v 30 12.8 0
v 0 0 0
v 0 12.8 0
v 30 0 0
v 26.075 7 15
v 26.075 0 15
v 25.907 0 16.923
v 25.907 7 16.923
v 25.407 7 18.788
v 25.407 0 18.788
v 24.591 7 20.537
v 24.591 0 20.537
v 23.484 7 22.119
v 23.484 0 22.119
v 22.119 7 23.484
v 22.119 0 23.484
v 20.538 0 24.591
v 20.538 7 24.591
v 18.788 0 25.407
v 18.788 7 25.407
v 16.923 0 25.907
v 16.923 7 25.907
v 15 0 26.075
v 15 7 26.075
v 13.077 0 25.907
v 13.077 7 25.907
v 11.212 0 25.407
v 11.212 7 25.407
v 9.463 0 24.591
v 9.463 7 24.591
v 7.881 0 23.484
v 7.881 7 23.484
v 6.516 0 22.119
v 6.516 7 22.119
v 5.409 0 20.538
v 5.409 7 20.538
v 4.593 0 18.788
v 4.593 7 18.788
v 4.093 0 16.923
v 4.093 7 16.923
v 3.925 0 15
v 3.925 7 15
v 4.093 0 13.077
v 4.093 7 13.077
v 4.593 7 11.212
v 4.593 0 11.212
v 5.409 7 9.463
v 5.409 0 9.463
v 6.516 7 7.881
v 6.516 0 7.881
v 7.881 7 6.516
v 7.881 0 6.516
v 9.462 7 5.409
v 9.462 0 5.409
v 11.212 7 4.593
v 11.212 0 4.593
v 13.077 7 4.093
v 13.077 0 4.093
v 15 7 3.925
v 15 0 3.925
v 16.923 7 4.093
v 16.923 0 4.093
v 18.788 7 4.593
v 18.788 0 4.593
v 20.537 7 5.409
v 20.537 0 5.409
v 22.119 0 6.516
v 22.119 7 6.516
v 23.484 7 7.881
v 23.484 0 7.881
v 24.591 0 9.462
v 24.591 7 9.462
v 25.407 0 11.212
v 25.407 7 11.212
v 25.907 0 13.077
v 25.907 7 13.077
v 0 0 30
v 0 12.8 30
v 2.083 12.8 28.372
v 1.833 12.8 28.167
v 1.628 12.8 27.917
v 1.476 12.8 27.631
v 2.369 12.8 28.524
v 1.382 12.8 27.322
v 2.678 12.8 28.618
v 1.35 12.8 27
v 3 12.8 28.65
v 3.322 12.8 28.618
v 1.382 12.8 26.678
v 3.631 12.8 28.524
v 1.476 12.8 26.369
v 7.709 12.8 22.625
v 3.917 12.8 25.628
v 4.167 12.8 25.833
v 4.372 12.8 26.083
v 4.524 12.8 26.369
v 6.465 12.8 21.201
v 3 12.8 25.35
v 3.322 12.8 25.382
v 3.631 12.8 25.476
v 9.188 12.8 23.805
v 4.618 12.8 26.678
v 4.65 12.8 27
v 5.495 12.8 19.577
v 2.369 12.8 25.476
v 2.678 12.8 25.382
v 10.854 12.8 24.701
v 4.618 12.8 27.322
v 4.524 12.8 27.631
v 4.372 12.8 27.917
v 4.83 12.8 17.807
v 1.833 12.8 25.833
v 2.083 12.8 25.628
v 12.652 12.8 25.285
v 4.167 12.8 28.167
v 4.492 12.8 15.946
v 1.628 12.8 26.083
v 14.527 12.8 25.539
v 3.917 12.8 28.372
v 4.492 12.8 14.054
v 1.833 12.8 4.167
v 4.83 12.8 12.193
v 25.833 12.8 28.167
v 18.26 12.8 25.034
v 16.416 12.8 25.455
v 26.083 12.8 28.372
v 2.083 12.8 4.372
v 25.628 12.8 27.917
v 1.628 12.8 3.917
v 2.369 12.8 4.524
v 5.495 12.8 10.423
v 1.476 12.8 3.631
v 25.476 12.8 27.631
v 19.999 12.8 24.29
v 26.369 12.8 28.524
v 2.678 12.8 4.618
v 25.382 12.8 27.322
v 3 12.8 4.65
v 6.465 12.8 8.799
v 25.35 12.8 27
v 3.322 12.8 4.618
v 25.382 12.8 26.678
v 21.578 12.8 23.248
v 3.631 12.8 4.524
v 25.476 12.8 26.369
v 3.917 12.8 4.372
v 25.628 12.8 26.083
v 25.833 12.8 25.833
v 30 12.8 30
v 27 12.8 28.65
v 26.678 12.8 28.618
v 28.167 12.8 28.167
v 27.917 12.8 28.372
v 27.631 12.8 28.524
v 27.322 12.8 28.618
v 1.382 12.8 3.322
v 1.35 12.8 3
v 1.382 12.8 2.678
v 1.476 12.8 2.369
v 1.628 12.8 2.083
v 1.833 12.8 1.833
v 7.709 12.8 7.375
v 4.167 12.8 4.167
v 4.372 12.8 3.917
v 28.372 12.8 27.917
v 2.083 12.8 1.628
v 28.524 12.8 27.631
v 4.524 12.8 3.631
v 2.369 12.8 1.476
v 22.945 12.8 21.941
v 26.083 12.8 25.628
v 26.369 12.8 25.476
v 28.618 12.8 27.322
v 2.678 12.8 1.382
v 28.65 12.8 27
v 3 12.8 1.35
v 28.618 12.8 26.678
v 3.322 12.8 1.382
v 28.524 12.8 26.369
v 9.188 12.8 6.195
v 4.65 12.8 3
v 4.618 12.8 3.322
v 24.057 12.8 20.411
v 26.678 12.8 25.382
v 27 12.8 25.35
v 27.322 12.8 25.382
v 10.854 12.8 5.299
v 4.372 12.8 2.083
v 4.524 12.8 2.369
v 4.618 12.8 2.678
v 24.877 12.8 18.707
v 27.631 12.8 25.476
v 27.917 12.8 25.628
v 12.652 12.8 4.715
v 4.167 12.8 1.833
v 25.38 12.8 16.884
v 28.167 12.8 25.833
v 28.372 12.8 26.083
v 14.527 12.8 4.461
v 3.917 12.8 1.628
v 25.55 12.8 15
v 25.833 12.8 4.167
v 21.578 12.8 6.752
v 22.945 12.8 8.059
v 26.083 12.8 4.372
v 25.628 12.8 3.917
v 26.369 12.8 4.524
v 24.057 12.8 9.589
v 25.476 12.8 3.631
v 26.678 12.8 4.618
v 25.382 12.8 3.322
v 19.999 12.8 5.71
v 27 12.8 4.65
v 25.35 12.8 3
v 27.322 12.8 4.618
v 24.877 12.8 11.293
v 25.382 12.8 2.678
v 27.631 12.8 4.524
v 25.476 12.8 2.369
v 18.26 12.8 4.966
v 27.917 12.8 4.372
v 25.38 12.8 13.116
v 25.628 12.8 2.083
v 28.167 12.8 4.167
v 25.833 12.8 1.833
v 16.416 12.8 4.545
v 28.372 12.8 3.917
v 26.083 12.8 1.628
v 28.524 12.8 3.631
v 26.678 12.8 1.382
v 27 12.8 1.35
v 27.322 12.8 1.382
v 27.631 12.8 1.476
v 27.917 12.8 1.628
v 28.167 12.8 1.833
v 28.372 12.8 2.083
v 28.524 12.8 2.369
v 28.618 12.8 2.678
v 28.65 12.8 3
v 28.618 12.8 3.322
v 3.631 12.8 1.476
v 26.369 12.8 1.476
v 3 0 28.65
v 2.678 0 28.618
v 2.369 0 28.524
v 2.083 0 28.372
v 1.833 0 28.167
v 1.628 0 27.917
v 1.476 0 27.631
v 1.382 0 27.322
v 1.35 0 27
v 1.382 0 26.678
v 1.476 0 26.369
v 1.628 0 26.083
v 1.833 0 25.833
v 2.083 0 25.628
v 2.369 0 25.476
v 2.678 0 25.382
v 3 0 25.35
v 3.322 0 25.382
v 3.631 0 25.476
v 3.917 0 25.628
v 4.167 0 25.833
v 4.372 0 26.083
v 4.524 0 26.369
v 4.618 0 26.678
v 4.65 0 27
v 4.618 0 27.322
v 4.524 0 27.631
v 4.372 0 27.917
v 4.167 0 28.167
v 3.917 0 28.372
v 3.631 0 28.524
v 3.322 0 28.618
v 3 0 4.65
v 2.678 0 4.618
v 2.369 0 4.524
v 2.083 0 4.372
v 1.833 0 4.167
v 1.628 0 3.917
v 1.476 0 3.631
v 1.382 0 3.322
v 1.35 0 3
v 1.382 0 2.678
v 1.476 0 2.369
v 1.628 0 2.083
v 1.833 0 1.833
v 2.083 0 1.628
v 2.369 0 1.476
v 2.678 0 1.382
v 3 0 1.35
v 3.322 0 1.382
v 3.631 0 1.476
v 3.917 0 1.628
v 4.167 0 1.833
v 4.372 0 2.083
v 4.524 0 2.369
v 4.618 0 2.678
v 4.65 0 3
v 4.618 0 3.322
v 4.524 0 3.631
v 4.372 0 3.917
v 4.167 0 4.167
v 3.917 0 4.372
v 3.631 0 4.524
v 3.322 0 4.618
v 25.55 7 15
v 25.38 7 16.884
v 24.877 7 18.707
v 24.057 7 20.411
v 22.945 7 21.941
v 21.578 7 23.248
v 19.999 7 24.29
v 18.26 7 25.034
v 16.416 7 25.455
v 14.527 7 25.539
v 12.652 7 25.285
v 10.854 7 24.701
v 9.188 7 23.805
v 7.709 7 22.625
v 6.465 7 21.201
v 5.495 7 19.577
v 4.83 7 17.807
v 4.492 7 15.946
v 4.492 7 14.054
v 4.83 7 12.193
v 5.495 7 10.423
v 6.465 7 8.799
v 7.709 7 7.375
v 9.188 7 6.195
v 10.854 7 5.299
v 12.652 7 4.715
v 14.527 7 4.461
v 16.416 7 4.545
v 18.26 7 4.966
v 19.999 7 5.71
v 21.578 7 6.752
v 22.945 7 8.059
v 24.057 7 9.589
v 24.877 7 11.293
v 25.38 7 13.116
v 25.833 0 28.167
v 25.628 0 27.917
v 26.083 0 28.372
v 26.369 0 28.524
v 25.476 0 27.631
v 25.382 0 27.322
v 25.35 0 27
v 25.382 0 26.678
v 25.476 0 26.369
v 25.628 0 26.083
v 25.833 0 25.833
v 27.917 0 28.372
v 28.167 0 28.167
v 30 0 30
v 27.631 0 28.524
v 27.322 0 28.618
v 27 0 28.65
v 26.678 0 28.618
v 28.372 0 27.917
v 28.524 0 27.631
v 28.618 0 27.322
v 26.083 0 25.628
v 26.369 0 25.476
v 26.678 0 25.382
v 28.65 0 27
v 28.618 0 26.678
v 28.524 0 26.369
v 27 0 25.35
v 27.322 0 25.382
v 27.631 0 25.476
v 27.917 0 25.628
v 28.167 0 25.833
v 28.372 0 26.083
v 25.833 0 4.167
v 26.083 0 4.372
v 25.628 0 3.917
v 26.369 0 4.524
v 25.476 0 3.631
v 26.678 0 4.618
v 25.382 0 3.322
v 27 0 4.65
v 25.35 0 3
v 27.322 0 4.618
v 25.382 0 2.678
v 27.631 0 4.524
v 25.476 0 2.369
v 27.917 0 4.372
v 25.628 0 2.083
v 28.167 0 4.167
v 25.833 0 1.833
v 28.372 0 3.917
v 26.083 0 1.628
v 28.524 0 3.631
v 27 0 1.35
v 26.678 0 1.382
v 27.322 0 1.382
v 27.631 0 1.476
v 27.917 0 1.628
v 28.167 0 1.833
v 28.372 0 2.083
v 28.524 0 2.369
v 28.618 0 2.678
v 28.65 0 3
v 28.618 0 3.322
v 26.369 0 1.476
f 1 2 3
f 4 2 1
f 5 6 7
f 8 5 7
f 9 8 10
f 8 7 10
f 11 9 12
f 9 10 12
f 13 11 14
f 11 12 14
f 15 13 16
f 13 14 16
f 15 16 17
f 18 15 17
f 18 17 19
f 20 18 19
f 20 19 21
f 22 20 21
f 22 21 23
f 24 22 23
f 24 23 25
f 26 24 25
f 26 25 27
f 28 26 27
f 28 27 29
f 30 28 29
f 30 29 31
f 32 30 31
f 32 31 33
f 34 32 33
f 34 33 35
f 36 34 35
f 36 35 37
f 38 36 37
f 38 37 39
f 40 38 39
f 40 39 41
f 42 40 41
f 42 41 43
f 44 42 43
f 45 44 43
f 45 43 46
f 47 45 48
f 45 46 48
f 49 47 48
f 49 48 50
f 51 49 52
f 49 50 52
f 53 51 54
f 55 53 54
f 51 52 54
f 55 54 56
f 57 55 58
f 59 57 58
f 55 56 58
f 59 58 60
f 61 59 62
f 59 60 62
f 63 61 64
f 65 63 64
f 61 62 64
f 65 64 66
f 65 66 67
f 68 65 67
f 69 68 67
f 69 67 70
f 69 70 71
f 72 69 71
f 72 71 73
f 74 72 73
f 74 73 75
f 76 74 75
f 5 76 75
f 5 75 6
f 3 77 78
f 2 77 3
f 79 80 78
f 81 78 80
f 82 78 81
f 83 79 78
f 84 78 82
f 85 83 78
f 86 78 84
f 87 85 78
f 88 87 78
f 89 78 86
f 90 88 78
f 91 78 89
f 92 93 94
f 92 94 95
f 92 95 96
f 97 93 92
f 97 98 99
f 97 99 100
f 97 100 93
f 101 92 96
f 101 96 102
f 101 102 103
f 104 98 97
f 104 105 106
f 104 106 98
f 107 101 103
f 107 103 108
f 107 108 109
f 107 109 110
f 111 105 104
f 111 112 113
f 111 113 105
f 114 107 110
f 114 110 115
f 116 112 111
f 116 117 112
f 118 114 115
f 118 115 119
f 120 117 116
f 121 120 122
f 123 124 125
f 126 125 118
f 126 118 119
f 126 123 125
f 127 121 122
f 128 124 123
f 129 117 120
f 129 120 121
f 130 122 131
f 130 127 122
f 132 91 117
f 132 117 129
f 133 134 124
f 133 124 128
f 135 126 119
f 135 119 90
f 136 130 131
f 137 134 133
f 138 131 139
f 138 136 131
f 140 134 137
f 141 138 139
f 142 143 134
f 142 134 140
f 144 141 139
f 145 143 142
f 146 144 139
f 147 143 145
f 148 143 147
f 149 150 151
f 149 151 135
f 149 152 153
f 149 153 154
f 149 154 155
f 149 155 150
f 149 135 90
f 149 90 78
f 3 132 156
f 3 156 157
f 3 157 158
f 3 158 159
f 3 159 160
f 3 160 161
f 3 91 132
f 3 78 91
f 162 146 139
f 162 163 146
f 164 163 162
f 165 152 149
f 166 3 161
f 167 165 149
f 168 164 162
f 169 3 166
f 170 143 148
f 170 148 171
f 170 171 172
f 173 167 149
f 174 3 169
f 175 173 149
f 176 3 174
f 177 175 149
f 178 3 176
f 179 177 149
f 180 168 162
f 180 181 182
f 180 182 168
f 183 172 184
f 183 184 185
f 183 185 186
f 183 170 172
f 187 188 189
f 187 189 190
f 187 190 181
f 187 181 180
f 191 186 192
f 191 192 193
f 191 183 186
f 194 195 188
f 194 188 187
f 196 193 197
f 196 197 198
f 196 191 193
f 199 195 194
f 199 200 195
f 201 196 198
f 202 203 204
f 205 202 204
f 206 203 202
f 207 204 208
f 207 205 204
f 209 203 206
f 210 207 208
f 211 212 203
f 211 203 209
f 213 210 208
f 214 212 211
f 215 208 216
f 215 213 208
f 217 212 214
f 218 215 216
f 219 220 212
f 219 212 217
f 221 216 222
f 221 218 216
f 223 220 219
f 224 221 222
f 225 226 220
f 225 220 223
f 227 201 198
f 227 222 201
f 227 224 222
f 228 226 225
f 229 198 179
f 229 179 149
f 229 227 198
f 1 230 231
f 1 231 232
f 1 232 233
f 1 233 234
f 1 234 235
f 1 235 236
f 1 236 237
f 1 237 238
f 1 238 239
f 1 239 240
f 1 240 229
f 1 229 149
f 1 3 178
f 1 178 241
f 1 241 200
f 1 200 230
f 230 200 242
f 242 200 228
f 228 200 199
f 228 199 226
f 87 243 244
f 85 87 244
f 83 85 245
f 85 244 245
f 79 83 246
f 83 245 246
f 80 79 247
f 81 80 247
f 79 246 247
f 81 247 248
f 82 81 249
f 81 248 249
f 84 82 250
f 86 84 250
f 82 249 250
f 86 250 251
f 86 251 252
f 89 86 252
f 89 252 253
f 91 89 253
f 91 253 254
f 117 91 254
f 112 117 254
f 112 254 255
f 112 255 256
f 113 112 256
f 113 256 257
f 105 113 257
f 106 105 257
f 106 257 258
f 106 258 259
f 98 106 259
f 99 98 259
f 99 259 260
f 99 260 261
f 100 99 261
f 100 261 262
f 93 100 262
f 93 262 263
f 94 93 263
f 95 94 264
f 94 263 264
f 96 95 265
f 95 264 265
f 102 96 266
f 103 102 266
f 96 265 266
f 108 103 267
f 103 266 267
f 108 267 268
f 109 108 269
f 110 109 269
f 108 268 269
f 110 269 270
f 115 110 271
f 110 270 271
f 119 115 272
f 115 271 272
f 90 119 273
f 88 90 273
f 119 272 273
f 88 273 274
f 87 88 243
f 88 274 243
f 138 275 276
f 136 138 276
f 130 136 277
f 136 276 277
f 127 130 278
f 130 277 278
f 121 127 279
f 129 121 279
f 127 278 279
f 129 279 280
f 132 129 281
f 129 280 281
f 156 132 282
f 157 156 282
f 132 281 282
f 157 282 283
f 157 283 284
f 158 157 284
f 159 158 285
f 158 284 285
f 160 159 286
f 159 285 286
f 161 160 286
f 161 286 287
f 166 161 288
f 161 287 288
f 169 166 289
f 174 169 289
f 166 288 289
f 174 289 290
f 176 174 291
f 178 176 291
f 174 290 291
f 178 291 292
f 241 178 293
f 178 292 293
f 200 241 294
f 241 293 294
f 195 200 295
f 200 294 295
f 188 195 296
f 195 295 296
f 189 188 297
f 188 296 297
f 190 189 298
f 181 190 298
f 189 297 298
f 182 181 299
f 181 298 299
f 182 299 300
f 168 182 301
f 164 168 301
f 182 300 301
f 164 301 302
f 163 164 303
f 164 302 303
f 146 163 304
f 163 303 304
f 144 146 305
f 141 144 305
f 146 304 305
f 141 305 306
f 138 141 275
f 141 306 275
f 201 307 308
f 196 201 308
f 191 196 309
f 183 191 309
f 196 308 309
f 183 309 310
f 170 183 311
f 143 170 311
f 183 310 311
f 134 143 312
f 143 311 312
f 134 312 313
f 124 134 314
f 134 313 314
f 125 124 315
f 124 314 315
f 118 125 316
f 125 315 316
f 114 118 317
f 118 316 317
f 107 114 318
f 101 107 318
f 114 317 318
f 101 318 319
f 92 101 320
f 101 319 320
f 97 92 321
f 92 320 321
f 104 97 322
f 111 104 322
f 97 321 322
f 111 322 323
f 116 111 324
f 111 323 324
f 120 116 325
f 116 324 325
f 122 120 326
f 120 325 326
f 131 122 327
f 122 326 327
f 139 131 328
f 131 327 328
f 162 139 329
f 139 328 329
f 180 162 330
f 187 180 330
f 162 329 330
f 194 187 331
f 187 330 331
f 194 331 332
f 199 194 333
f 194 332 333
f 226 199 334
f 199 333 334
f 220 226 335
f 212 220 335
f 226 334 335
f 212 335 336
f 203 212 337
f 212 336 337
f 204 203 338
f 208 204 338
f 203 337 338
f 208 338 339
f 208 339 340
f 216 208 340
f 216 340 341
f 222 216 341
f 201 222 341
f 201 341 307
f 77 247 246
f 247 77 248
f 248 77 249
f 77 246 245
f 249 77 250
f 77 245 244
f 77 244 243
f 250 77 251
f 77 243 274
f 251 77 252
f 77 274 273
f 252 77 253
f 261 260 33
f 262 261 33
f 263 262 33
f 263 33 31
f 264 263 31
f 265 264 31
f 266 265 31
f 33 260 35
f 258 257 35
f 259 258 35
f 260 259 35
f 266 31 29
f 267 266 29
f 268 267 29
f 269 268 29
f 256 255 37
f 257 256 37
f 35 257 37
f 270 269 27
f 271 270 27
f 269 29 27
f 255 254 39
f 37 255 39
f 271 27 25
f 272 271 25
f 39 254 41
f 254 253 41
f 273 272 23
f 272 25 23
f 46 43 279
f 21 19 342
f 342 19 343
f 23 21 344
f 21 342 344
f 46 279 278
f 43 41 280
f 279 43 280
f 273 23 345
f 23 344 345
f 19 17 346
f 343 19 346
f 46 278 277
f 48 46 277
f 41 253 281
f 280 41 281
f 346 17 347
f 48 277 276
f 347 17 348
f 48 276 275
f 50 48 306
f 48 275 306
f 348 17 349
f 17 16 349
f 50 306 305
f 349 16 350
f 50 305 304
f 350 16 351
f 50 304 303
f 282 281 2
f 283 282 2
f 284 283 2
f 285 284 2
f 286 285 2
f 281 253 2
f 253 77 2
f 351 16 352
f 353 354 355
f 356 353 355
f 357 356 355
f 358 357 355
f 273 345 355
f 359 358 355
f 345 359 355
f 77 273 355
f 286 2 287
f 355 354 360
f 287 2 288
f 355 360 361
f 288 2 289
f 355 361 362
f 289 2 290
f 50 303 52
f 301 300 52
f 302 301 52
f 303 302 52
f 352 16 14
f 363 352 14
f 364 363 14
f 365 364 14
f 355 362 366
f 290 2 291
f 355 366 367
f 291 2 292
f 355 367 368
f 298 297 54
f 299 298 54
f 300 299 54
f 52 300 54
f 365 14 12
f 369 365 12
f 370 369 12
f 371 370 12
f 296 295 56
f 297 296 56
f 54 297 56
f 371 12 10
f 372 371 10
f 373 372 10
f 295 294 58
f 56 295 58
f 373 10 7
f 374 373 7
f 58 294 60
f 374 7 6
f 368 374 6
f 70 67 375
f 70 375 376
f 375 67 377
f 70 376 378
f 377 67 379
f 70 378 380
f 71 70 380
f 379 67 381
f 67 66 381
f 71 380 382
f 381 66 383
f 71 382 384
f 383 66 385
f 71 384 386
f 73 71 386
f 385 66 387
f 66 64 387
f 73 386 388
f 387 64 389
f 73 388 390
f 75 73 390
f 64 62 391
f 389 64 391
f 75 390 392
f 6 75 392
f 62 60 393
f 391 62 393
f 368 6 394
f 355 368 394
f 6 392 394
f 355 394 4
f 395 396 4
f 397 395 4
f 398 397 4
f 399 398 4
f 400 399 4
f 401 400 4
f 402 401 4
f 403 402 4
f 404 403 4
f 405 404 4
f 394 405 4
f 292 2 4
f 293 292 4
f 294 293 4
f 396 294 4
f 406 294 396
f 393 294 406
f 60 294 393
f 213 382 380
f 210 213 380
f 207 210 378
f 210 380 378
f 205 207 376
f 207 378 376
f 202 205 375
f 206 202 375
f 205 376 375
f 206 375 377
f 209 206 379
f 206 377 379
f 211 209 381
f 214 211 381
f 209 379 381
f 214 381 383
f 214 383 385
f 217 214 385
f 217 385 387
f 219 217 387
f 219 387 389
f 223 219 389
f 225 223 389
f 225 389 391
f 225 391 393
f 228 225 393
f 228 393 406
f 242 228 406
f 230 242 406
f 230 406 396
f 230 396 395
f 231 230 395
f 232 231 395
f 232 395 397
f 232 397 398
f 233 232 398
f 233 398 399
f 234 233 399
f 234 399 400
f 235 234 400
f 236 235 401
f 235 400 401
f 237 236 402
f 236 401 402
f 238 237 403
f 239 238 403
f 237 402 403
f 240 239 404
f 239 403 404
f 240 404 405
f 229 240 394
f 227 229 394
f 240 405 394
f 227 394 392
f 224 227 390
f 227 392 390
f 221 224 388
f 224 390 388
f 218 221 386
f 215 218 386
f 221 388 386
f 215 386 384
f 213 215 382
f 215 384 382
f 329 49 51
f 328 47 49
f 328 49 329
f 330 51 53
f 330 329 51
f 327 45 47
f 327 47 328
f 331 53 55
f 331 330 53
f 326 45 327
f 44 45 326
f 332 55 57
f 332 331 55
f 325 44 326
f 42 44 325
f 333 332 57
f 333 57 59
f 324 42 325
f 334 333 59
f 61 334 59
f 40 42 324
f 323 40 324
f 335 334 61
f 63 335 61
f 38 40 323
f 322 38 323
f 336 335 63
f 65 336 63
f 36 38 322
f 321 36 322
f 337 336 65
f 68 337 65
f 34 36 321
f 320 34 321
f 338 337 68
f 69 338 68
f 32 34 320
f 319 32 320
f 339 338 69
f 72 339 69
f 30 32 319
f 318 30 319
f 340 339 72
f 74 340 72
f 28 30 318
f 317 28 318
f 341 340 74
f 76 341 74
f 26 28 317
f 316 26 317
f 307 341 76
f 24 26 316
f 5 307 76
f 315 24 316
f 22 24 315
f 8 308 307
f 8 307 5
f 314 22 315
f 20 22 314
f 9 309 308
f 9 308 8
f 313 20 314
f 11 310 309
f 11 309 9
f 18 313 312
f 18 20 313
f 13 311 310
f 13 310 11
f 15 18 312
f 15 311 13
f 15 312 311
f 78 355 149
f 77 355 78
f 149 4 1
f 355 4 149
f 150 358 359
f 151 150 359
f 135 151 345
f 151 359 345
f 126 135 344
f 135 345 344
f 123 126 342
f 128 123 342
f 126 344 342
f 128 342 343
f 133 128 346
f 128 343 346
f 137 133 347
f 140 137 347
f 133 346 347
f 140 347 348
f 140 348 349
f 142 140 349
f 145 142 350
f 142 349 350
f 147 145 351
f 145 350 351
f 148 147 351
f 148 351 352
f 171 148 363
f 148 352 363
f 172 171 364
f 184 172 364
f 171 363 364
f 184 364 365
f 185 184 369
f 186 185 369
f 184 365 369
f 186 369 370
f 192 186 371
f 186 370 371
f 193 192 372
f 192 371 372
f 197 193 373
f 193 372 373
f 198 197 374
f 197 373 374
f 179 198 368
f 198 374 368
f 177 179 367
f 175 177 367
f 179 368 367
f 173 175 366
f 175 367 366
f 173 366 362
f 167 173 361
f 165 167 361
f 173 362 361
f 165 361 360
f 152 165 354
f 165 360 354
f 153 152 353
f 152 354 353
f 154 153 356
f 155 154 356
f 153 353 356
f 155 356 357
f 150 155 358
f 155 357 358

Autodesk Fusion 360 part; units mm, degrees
sketch "Sketch1" plane through (0, 0, 0) normal (0, 1, 0) x (1, 0, 0)
  line L0 (0, 0) -> (30, 0)
  line L1 (30, 0) -> (30, -30)
  line L2 (30, -30) -> (0, -30)
  line L3 (0, -30) -> (0, 0)
  dimension "d1" = 30
extrude "Extrude1" add sketch "Sketch1" along normal blind 12.8
sketch "Sketch2" plane through (0, 12.8, 0) normal (0, 1, 0) x (-1, 0, 0)
  line L0 (0, 30) -> (-30, 30)
  line L1 (-30, 30) -> (-30, 0)
  line L2 (-30, 0) -> (0, 0)
  line L3 (0, 0) -> (0, 30)
  line L4 (0, 15) -> (-30, 15) construction
  line L5 (-15, 0) -> (-15, 30) construction
  circle A0 centre (-15, 15) radius 4.5
  line L6 (-3, 27) -> (-27, 27) construction
  line L7 (-27, 27) -> (-27, 3) construction
  line L8 (-27, 3) -> (-3, 3) construction
  line L9 (-3, 3) -> (-3, 27) construction
  line L10 (-3, 27) -> (-27, 3) construction
  line L11 (-27, 27) -> (-3, 3) construction
  point P0 (-15, 15)
  point P1 (-15, 15)
  point P2 (-27, 3)
  point P3 (-3, 3)
  point P4 (-3, 27)
  point P5 (-27, 27)
  dimension "d7" = 9
  dimension "d14" = 24
  dimension "d15" = 24
sketch "Sketch3" plane through (0, 0, 0) normal (0, -1, 0) x (1, 0, 0)
  line L0 (30, 30) -> (0, 30)
  line L1 (0, 30) -> (0, 0)
  line L2 (0, 0) -> (30, 0)
  line L3 (30, 0) -> (30, 30)
  circle A0 centre (15, 15) radius 11.075
  circle A1 centre (15, 15) radius 10.55
  dimension "d11" = 22.15
  dimension "d31" = 21.1
hole "Hole2" at (3, 12.8, 3) direction (0, -1, 0) diameter 3.3 end through all
hole "Hole3" at (27, 12.8, 3) direction (0, -1, 0) diameter 3.3 end through all
hole "Hole4" at (27, 12.8, 27) direction (0, -1, 0) diameter 3.3 end through all
hole "Hole5" at (3, 12.8, 27) direction (0, -1, 0) diameter 3.3 end through all
extrude "Extrude7" cut sketch "Sketch3" against normal blind 7 contours A0
extrude "Extrude8" cut sketch "Sketch3" against normal through all contours A1
